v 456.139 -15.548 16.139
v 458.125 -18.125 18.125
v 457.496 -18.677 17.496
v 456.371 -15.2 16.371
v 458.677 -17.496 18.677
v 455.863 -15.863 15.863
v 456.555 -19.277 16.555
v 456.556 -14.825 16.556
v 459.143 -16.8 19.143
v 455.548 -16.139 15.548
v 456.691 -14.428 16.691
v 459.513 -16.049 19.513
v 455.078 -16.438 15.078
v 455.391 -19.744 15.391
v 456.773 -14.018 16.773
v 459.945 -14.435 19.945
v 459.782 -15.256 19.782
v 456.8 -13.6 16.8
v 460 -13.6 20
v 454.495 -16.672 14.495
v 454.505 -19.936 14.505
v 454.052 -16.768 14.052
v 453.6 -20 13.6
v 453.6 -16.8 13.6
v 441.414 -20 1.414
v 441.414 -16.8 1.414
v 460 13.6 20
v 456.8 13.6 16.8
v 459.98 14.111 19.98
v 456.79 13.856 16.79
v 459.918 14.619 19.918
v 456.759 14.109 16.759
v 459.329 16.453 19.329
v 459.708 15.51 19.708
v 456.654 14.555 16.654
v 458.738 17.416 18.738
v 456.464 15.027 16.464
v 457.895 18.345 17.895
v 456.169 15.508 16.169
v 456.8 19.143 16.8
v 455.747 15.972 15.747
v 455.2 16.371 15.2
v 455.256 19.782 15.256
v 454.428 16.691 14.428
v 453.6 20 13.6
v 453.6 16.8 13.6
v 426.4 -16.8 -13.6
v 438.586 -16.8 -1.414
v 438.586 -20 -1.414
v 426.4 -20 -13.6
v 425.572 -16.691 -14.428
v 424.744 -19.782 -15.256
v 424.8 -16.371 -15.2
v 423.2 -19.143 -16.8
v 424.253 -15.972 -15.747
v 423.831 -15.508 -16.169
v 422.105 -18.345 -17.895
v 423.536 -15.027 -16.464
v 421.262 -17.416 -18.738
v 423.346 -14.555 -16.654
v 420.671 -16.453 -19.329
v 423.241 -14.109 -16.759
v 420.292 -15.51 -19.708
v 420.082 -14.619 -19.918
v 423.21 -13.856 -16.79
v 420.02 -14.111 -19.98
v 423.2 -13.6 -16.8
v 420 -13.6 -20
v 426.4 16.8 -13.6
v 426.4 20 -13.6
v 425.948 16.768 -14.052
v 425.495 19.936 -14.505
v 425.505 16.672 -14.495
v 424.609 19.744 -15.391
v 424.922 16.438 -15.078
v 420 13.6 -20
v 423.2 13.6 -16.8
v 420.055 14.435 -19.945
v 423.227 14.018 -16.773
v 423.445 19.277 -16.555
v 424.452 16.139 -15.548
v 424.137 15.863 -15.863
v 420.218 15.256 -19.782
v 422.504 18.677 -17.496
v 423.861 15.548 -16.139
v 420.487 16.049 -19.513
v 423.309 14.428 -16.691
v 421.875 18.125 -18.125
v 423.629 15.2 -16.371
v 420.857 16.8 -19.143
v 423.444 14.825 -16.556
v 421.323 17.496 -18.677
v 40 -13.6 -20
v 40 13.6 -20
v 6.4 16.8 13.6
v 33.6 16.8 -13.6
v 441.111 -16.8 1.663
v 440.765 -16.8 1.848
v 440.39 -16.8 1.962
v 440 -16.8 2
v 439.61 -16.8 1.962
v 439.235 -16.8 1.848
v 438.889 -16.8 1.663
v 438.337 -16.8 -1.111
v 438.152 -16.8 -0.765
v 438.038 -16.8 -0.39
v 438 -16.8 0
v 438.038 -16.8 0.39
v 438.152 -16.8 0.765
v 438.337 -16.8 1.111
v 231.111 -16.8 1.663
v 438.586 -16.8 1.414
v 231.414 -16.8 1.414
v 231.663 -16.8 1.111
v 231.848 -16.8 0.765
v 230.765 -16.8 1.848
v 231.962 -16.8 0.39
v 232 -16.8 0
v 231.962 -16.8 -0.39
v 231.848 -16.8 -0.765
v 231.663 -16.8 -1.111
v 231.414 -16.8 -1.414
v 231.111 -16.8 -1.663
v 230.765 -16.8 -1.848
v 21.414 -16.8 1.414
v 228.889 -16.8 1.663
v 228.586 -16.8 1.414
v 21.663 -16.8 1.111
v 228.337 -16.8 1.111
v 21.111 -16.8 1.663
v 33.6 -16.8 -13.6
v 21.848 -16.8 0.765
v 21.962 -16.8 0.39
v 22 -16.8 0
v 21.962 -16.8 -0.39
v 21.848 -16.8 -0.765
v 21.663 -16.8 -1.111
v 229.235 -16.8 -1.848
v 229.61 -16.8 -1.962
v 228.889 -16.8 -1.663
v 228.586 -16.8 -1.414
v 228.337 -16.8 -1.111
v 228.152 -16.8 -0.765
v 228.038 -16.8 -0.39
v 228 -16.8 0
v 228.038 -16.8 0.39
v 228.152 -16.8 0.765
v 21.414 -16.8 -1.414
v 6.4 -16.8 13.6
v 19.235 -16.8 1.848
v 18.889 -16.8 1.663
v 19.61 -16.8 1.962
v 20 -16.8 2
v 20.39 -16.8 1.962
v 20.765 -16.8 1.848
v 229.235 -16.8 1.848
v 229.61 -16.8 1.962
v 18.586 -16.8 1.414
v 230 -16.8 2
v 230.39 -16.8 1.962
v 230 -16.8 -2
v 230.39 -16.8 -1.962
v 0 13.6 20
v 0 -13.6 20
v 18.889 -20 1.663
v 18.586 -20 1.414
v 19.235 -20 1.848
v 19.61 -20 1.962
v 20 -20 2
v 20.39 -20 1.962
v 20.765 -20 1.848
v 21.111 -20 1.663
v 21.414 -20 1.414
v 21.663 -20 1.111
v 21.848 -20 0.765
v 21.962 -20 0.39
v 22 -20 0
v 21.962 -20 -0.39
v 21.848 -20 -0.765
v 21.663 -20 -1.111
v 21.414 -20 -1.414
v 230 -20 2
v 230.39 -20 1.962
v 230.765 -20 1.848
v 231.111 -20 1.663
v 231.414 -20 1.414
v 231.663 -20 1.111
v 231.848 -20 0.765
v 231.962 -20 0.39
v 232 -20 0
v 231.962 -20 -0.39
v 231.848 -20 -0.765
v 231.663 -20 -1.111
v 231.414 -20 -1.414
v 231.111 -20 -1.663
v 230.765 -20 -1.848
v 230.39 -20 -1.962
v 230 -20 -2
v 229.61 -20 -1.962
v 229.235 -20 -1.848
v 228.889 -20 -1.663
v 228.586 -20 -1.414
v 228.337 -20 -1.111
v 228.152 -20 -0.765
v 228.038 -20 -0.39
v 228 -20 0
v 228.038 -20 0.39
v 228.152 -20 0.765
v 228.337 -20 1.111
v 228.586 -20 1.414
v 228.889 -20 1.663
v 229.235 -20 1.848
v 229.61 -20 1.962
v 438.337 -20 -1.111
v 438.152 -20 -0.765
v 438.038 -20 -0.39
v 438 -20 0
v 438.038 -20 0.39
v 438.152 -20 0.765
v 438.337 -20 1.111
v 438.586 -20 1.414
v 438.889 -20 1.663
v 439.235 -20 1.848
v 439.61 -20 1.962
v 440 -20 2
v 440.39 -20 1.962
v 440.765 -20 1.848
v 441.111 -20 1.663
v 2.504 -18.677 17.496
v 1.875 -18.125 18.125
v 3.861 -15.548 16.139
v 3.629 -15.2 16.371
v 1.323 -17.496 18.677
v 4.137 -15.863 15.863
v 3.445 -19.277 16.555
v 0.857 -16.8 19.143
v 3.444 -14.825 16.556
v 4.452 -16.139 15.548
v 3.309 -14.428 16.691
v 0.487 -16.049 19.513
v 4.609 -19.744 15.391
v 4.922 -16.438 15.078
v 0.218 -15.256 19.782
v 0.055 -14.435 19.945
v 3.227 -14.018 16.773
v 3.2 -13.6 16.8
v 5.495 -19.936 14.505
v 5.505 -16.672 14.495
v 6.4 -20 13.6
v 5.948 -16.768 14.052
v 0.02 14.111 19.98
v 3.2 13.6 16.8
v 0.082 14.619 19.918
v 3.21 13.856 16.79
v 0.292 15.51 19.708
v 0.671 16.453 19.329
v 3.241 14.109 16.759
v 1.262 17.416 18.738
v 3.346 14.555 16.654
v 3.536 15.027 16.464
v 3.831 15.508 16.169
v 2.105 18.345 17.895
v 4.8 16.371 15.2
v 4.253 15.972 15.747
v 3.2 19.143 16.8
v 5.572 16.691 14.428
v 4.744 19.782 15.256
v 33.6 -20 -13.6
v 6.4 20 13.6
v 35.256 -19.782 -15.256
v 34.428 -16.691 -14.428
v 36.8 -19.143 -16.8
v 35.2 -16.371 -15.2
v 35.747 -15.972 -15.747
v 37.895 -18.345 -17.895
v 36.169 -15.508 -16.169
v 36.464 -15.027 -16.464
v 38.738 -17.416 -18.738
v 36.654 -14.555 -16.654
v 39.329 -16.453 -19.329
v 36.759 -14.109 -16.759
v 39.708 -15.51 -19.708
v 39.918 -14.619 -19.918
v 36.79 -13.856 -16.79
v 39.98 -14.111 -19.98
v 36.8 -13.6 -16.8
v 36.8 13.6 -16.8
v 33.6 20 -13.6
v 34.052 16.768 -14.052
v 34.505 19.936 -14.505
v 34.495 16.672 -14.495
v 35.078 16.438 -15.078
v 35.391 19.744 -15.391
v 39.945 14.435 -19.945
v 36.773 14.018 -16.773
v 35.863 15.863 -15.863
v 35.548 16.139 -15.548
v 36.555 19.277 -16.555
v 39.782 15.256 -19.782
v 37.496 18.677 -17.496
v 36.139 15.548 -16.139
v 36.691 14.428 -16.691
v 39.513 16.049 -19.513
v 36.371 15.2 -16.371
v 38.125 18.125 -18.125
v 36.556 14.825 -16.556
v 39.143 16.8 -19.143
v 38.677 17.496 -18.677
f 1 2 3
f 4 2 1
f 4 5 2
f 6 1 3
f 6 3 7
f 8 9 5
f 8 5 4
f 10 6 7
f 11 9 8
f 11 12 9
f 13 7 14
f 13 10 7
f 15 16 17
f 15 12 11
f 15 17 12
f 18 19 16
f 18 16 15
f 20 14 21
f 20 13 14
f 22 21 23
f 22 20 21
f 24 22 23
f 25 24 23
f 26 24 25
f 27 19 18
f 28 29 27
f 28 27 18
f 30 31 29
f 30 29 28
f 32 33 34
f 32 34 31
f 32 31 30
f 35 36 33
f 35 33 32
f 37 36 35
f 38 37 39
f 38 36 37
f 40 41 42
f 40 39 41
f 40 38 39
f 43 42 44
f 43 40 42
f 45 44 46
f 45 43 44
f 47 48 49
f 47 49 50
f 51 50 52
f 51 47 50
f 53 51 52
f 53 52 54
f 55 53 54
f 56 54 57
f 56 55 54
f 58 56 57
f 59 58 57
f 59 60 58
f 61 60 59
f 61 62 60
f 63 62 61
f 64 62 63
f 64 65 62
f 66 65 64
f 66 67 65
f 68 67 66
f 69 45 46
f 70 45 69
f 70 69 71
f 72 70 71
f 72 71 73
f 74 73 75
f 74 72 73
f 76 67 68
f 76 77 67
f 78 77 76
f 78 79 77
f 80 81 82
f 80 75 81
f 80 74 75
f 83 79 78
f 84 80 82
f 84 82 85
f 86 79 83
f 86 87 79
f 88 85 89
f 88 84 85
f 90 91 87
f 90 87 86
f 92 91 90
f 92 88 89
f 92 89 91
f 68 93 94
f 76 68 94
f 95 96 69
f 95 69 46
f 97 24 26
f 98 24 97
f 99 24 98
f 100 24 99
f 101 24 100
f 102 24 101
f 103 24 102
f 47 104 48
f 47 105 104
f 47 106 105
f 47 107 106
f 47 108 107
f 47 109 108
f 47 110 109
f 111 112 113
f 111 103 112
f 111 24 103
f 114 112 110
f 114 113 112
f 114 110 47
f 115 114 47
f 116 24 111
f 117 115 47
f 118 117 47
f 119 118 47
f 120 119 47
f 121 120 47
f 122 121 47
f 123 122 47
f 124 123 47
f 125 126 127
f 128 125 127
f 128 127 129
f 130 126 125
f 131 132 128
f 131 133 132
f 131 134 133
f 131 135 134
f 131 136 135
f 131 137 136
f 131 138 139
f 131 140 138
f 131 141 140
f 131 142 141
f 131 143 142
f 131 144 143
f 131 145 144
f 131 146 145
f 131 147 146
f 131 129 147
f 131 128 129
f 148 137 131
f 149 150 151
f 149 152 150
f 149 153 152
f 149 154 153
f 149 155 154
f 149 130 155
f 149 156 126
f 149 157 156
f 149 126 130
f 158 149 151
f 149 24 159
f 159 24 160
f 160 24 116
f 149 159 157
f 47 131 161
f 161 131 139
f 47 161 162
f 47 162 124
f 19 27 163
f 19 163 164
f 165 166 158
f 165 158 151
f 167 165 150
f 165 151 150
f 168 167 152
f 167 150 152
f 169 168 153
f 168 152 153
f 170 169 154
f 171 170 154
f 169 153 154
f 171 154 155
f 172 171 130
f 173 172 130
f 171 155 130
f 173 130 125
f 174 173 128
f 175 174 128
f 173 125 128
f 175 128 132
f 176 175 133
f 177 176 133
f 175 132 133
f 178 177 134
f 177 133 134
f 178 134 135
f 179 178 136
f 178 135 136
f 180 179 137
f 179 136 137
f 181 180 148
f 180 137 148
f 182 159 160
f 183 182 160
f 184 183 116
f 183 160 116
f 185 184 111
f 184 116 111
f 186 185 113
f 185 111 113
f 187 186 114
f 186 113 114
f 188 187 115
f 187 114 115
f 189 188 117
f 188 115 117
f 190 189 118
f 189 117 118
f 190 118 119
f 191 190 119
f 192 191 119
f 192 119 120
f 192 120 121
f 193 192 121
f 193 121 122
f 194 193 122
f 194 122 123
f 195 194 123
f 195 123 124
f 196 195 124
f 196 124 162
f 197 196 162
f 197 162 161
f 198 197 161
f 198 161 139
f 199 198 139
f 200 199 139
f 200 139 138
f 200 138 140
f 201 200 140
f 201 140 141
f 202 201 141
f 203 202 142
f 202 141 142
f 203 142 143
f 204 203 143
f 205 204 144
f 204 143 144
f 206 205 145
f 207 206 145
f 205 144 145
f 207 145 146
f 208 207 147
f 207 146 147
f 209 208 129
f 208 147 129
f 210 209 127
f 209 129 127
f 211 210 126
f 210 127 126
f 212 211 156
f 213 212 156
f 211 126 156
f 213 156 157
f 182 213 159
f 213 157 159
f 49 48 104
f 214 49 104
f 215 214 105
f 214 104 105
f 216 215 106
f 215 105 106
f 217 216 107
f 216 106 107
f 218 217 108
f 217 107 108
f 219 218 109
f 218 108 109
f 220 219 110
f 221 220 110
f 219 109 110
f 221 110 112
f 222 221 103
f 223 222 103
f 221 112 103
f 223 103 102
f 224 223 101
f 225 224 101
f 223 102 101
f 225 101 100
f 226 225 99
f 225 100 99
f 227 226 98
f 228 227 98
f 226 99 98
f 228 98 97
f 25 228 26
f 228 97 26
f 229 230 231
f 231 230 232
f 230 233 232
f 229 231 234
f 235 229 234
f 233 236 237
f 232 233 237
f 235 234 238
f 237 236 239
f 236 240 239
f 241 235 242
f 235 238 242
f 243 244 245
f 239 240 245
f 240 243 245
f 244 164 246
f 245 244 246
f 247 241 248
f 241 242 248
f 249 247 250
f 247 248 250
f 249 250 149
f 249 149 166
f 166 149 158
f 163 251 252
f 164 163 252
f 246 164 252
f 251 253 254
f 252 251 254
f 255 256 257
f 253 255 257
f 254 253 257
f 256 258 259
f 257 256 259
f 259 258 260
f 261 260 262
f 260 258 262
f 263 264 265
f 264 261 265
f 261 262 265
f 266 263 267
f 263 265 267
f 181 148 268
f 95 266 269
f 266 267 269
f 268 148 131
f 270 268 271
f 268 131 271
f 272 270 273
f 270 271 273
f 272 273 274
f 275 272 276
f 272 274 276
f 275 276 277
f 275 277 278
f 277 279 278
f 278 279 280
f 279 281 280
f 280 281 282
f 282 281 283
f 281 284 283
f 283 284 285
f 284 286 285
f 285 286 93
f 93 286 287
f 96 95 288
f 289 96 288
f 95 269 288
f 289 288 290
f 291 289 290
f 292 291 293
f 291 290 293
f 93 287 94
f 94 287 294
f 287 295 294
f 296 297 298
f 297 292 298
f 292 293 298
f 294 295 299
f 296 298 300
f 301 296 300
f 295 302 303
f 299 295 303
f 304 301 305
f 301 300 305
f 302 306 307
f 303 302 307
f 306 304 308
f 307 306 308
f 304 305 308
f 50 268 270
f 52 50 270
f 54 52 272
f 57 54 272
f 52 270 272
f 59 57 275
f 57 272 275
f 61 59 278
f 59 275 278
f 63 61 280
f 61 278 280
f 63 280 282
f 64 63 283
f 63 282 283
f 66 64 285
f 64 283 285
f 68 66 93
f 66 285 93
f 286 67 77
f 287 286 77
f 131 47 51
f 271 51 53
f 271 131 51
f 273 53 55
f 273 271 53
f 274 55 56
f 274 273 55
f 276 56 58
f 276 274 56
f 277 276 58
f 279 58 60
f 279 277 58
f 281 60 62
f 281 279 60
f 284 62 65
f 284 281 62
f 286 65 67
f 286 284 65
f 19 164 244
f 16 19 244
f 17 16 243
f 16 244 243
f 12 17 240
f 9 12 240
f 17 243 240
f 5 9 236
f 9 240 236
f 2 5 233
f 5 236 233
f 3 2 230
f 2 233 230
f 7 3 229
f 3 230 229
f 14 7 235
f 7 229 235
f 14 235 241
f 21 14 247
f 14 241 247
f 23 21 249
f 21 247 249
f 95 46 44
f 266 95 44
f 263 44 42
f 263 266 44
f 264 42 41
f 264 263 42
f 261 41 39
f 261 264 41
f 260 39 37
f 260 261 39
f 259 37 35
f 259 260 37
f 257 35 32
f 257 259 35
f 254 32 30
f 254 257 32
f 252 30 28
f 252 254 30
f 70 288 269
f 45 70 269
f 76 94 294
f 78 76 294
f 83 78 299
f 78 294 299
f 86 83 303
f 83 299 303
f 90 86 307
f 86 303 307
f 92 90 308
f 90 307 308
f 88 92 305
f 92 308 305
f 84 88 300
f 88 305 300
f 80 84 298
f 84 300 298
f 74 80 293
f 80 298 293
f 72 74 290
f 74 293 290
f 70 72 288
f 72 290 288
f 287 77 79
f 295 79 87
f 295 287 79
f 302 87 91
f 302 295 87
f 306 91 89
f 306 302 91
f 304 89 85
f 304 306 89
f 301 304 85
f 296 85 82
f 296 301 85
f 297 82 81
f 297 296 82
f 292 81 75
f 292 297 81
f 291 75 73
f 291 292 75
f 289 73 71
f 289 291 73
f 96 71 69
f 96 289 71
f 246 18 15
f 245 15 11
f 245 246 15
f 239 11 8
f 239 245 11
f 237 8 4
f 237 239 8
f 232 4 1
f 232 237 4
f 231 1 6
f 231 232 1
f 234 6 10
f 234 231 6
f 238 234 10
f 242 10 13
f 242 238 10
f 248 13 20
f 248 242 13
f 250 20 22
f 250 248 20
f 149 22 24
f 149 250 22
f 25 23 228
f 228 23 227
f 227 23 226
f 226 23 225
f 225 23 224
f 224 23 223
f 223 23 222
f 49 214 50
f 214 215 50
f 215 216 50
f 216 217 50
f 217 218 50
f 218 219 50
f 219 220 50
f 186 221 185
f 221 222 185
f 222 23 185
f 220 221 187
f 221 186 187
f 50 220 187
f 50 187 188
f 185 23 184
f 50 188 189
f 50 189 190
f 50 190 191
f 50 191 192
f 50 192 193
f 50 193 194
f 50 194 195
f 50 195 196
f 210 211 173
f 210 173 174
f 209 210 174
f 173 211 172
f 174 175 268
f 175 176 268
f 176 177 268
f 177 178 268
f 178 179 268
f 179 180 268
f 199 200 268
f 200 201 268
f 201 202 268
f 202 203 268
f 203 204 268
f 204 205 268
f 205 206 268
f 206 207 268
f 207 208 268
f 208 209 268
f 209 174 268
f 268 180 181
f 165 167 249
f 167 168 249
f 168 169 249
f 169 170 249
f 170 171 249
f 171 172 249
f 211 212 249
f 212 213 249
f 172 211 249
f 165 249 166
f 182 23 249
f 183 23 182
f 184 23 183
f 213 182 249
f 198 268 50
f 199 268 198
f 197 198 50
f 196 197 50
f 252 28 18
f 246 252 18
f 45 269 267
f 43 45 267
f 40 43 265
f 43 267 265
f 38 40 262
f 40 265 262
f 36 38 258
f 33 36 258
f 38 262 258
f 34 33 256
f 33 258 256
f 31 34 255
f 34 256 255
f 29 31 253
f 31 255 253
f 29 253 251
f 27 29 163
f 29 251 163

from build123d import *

# Parameters (mm, degrees)
TUBE_SQUARE_40_X_40_X_3_2_9_DEPTH = 460
CUT_EXTRUDE1_DEPTH                = 463.168800332
SKETCH15_R                        = 2
CUT_EXTRUDE4_DEPTH                = 461.868744872


with BuildPart() as part:
    # Sketch12 → Tube (square) 40 X 40 X 3.2(9) (new body)
    with BuildSketch(Plane(origin=(0, 0, 0), x_dir=(0, 0, -1), z_dir=(1, 0, 0))):
        with BuildLine():
            Line((-13.6, -20), (13.6, -20))
            ThreePointArc((13.6, -20), (18.1254834, -18.1254834), (20, -13.6))
            Line((20, -13.6), (20, 13.6))
            ThreePointArc((20, 13.6), (18.1254834, 18.1254834), (13.6, 20))
            Line((13.6, 20), (-13.6, 20))
            ThreePointArc((-13.6, 20), (-18.1254834, 18.1254834), (-20, 13.6))
            Line((-20, 13.6), (-20, -13.6))
            ThreePointArc((-20, -13.6), (-18.1254834, -18.1254834), (-13.6, -20))
        make_face()
        with BuildLine():
            Line((-13.6, -16.8), (13.6, -16.8))
            ThreePointArc((13.6, -16.8), (15.8627417, -15.8627417), (16.8, -13.6))
            Line((16.8, -13.6), (16.8, 13.6))
            ThreePointArc((16.8, 13.6), (15.8627417, 15.8627417), (13.6, 16.8))
            Line((13.6, 16.8), (-13.6, 16.8))
            ThreePointArc((-13.6, 16.8), (-15.8627417, 15.8627417), (-16.8, 13.6))
            Line((-16.8, 13.6), (-16.8, -13.6))
            ThreePointArc((-16.8, -13.6), (-15.8627417, -15.8627417), (-13.6, -16.8))
        make_face(mode=Mode.SUBTRACT)
    extrude(amount=TUBE_SQUARE_40_X_40_X_3_2_9_DEPTH)

    # Sketch13 → Cut-Extrude1 (cut, through all)
    with BuildSketch(Plane(origin=(0, 20, 0), x_dir=(1, 0, 0), z_dir=(0, 1, 0))):
        Polygon((460, 20), (460, -20), (420, 20), align=None)
        Polygon((0, 20), (0, -20), (40, 20), align=None)
    extrude(amount=-CUT_EXTRUDE1_DEPTH, mode=Mode.SUBTRACT)

    # Sketch15 → Cut-Extrude4 (cut, through all)
    with BuildSketch(Plane(origin=(0, 0, 0), x_dir=(1, 0, 0), z_dir=(0, 1, 0))):
        with Locations((440, 0)):
            Circle(SKETCH15_R)
        with Locations(Location((230, 0, 0), (0, 0, 270))):
            Circle(SKETCH15_R)
        with Locations((20, 0)):
            Circle(SKETCH15_R)
    extrude(amount=-CUT_EXTRUDE4_DEPTH, mode=Mode.SUBTRACT)


solid = part.part
